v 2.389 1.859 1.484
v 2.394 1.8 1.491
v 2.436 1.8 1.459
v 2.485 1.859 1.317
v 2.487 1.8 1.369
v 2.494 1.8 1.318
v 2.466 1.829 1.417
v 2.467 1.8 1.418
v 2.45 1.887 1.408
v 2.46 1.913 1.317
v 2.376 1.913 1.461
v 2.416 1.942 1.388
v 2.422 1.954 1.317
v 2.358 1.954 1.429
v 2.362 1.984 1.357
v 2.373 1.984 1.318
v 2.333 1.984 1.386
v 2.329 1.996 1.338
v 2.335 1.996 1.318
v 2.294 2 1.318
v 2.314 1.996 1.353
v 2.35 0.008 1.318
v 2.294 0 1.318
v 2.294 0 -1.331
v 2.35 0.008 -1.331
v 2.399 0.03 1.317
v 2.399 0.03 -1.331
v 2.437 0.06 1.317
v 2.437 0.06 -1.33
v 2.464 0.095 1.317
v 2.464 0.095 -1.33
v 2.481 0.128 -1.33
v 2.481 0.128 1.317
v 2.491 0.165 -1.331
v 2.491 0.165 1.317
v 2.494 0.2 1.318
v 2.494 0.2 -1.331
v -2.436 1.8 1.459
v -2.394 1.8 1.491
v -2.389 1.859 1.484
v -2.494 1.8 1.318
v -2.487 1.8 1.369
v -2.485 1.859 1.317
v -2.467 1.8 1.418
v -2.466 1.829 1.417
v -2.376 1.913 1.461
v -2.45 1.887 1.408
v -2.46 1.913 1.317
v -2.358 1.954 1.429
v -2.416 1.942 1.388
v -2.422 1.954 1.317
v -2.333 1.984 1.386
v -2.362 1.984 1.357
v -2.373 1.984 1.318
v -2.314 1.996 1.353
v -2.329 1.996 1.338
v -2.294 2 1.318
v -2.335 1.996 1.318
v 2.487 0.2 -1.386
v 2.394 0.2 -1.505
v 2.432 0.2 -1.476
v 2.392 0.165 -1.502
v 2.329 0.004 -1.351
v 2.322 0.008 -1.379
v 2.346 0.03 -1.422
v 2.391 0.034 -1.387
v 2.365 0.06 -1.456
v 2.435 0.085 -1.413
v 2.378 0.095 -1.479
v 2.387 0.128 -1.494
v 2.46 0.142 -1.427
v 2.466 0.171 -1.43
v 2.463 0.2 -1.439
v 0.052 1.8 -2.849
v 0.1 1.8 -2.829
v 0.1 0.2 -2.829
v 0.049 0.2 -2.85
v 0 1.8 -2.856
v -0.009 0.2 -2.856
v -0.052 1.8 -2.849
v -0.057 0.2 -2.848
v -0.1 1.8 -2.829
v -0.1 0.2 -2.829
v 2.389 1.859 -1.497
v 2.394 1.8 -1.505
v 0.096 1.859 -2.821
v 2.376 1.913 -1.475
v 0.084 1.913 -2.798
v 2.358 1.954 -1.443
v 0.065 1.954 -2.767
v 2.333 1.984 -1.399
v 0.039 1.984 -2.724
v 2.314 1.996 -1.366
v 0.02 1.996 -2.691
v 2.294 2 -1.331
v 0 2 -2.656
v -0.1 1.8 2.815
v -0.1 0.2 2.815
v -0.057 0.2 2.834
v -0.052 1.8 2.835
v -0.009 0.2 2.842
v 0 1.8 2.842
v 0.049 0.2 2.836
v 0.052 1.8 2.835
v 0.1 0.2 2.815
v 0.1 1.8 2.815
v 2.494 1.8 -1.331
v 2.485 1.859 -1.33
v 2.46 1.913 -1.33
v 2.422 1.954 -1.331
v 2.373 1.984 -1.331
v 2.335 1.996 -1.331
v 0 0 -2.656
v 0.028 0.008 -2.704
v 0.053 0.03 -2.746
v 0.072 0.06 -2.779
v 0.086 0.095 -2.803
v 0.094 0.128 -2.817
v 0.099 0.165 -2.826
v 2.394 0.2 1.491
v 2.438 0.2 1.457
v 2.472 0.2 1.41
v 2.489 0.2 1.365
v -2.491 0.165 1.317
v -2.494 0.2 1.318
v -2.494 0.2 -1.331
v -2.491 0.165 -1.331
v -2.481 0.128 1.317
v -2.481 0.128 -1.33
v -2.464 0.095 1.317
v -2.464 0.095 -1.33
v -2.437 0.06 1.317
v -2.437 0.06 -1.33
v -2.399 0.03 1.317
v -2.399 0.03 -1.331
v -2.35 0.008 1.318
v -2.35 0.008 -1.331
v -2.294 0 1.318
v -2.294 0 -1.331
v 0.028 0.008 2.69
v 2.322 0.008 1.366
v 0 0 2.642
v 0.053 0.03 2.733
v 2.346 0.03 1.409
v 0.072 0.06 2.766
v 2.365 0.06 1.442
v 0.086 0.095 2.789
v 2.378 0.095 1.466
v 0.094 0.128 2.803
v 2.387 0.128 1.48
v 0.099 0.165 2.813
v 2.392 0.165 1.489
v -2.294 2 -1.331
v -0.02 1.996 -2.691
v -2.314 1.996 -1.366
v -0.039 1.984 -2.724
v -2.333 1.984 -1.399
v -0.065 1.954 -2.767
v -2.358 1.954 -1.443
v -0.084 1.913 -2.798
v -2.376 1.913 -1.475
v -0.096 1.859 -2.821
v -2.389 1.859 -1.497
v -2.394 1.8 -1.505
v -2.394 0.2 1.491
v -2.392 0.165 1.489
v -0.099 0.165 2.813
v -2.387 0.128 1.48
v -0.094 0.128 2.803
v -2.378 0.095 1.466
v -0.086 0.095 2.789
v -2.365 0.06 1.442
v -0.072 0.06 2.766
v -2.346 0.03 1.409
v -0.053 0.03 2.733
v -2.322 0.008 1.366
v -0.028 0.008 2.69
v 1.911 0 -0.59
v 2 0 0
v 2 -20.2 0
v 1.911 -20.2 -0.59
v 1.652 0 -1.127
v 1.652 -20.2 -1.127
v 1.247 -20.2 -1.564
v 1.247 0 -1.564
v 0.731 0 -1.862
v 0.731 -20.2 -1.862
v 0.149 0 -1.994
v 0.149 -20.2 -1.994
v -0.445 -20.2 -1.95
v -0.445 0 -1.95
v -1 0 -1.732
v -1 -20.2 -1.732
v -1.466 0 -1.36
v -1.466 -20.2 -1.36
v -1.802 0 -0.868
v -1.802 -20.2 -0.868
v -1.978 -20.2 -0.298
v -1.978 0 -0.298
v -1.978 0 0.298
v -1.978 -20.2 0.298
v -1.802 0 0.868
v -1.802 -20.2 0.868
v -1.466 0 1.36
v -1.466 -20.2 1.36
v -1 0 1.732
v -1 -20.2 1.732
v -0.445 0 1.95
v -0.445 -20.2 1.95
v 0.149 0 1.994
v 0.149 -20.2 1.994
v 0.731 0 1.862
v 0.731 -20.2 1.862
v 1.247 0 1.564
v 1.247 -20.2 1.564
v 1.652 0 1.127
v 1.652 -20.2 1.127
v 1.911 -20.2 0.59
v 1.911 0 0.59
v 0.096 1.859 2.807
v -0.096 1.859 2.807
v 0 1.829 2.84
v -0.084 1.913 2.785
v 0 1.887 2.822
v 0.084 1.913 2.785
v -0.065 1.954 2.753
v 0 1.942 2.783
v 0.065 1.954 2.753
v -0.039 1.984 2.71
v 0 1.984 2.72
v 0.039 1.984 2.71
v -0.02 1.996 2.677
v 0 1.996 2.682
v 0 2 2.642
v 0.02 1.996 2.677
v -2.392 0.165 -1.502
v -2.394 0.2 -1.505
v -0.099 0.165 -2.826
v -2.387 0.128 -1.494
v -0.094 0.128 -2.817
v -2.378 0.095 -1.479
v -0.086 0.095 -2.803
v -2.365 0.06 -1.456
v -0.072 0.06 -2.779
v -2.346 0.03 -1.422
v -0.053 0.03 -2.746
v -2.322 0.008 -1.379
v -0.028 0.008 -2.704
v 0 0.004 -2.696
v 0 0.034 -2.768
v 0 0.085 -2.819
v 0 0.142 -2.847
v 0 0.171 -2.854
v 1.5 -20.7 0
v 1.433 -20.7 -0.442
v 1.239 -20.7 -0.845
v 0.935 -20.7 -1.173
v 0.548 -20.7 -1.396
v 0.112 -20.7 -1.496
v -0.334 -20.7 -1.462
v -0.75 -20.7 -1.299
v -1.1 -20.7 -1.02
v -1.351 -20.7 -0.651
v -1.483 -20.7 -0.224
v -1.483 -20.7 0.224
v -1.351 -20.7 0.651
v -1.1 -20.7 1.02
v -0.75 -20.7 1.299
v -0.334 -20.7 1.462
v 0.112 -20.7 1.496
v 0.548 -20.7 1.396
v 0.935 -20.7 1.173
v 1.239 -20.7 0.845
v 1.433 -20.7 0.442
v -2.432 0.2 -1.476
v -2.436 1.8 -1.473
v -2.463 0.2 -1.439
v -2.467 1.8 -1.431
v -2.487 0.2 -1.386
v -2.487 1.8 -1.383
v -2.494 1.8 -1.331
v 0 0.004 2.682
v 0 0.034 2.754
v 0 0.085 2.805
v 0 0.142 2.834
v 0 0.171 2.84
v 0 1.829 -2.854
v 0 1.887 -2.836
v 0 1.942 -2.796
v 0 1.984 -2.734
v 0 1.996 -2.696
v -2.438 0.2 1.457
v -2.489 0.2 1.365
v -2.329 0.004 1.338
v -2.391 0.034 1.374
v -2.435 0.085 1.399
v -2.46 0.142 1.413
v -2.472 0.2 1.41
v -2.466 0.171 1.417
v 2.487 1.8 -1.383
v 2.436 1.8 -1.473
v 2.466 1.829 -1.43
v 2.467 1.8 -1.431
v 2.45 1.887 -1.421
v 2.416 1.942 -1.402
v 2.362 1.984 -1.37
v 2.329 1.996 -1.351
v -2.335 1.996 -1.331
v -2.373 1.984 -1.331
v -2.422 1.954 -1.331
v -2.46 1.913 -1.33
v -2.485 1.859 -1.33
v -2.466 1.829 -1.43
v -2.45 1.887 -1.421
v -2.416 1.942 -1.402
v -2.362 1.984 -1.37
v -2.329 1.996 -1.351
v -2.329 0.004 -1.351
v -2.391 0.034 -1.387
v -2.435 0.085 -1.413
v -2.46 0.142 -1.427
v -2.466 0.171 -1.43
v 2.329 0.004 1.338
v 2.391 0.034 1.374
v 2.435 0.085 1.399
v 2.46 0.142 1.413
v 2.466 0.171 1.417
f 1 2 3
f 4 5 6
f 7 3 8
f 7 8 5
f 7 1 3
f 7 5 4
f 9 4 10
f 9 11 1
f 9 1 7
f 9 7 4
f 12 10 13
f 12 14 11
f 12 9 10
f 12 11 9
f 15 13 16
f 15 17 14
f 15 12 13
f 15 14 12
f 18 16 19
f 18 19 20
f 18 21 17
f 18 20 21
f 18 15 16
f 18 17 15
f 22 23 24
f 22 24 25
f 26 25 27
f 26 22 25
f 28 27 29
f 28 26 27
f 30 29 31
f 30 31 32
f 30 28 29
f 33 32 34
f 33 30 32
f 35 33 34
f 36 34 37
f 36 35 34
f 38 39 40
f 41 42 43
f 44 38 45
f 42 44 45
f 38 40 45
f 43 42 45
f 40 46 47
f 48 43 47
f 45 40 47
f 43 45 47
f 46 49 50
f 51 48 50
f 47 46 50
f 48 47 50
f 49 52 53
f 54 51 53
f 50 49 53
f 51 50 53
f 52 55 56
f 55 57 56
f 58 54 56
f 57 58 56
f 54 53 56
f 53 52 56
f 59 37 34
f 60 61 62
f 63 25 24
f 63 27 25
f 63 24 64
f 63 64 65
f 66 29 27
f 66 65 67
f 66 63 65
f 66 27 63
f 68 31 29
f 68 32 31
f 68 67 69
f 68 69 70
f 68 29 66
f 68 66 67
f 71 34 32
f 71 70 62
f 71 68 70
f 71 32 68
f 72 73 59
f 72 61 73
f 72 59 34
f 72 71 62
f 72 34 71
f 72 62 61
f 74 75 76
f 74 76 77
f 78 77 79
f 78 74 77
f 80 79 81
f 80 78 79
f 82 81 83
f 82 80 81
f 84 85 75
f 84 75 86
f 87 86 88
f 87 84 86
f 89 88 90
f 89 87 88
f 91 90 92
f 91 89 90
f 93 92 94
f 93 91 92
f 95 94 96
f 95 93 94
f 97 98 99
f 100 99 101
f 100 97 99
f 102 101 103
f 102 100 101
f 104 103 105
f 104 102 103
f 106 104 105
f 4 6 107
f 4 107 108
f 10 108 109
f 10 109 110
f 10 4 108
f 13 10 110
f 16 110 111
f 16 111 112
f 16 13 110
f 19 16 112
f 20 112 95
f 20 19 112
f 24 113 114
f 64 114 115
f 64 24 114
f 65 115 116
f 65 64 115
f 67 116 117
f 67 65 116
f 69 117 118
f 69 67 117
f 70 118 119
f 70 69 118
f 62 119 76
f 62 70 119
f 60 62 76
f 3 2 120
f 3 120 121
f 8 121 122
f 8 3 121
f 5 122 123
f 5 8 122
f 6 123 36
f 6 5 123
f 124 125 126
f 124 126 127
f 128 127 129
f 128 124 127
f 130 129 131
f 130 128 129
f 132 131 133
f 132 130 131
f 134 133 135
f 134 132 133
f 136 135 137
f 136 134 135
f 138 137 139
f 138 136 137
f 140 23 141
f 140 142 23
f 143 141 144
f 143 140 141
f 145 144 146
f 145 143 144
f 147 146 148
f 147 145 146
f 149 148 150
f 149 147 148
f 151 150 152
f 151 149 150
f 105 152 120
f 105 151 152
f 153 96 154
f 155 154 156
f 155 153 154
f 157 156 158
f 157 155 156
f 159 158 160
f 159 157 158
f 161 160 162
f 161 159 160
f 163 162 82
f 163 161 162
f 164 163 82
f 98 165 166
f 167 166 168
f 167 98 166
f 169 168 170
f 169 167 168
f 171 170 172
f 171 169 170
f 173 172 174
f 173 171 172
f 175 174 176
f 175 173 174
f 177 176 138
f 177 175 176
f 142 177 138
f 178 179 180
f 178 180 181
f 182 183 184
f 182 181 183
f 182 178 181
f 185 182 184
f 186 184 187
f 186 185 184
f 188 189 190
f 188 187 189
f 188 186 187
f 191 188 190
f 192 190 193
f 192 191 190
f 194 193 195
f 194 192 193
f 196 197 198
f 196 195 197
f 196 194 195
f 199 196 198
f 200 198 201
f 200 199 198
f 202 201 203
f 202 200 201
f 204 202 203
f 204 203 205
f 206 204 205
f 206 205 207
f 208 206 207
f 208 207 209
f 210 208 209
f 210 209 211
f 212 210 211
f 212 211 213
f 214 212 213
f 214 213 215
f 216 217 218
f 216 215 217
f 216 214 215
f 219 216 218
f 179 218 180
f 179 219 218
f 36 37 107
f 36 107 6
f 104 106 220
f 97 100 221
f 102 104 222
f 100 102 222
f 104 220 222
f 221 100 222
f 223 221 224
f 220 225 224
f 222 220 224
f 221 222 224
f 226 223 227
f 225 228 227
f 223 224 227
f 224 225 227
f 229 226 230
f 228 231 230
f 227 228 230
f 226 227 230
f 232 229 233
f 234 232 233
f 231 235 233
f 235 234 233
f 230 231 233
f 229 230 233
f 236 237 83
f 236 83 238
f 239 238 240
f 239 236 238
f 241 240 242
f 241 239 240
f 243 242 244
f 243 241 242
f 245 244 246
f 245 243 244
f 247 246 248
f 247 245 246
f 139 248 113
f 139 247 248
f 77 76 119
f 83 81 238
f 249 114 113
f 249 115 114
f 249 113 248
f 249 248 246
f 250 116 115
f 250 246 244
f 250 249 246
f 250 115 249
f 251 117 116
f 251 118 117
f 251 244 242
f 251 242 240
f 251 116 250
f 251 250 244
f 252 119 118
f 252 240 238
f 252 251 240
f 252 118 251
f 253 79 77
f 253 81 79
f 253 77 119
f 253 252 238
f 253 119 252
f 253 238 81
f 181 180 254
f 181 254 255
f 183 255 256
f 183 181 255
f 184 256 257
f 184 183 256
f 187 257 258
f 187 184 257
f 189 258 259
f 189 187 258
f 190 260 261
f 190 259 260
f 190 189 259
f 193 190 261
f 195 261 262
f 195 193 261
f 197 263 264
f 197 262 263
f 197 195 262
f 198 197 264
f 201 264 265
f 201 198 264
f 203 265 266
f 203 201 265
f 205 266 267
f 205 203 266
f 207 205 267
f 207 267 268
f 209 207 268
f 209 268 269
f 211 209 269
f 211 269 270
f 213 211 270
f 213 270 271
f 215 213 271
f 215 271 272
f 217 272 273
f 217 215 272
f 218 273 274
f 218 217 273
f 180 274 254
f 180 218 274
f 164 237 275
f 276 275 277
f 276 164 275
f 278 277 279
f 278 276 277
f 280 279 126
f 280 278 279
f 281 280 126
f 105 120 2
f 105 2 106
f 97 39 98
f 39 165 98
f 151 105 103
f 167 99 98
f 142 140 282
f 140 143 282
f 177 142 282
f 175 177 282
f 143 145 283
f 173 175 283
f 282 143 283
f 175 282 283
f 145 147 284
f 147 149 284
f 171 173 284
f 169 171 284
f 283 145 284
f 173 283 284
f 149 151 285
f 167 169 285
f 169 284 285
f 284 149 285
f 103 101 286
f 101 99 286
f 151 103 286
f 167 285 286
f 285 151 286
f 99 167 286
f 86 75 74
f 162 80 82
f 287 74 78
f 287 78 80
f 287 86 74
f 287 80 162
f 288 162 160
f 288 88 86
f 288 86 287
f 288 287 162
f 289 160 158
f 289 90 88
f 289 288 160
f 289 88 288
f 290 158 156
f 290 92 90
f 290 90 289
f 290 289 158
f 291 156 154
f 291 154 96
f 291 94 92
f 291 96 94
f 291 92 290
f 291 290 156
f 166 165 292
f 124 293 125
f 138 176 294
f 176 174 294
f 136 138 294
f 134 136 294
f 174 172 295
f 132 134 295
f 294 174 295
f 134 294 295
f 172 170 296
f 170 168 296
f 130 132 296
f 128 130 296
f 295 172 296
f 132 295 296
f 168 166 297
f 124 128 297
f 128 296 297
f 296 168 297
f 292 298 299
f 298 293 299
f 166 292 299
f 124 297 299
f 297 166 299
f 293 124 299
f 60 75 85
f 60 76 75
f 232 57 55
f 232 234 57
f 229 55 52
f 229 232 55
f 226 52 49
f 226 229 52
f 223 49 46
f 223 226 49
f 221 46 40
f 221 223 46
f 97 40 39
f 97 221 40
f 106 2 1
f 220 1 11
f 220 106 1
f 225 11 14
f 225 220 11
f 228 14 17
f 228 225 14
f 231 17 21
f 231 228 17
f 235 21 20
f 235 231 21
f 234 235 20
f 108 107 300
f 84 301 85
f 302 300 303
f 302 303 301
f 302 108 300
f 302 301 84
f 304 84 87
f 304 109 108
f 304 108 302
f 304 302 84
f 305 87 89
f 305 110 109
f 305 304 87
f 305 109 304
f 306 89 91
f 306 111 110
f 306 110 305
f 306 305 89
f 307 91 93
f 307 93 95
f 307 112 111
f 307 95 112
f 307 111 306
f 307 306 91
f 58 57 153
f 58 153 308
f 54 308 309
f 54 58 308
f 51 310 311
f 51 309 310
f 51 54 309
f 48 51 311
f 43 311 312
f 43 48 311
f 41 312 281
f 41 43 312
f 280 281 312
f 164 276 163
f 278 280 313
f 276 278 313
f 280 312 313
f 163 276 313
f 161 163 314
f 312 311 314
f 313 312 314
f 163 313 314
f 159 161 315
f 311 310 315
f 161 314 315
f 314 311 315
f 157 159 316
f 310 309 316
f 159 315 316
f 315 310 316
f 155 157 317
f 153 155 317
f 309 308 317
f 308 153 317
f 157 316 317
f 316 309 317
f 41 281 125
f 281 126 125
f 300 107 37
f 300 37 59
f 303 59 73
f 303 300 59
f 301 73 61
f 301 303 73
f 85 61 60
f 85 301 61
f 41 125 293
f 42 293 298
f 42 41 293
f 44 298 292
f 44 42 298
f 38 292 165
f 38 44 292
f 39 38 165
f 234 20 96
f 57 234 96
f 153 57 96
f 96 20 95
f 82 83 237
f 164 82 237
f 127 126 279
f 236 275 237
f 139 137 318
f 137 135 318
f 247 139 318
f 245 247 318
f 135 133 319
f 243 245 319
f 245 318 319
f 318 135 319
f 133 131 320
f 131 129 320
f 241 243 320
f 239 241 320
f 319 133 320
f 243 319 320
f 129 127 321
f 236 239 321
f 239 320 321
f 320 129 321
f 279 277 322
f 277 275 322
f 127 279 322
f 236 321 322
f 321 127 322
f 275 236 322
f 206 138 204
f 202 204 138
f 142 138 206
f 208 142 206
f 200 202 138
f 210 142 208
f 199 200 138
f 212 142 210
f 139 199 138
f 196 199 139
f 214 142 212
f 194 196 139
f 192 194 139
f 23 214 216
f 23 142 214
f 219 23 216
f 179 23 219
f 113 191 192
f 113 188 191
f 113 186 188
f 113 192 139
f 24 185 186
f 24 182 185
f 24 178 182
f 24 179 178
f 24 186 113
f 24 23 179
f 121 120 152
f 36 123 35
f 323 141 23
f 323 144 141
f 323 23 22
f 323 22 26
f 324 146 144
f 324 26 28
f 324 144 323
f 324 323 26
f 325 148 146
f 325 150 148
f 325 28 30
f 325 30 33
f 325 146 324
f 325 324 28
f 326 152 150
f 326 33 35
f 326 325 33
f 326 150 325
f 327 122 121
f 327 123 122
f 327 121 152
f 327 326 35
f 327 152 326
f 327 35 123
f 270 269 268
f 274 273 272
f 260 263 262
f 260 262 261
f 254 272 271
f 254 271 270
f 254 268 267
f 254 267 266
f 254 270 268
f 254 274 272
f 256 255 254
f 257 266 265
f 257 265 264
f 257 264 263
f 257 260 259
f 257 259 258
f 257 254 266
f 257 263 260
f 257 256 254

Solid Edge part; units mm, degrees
sketch "Sketch1" plane through (0, 0, 0) normal (0, -1, 0) x (1, 0, 0)
  circle A0 centre (0, 0) radius 2
extrude "Protrusion1" add sketch "Sketch1" along normal blind 20.7
sketch "Sketch2" plane through (0, 0, 0) normal (0, 1, 0) x (1, 0, 0)
  line L0 (2.4942, -1.4332) -> (0, -2.8732)
  line L1 (-2.4942, -1.4332) -> (0, -2.8732)
  line L2 (-2.4942, 1.4468) -> (-2.4942, -1.4332)
  line L3 (0, 2.8868) -> (-2.4942, 1.4468)
  line L4 (0, 2.8868) -> (2.4942, 1.4468)
  line L5 (2.4942, 1.4468) -> (2.4942, -1.4332)
extrude "ExtrudedProtrusion_2" add sketch "Sketch2" along normal blind 2
fillet "Round_1" radius 0.2 12 edges at (1.2471, 0, 2.1532) (-1.2471, 0, 2.1532) (2.4942, 0, -0.0068) (1.2471, 0, -2.1668) (-1.2471, 0, -2.1668) (-2.4942, 0, -0.0068) (1.2471, 2, 2.1532) (-1.2471, 2, 2.1532) (-2.4942, 2, -0.0068) (-1.2471, 2, -2.1668) (1.2471, 2, -2.1668) (2.4942, 2, -0.0068)
fillet "Round_2" radius 0.2 18 edges at (0, 1, 2.8732) (0, 0.0586, 2.8056) (0, 1.9414, 2.8056) (2.4942, 1, 1.4332) (2.4356, 0.0586, 1.3994) (2.4356, 1.9414, 1.3994) (2.4942, 1, -1.4468) (2.4356, 0.0586, -1.4129) (2.4356, 1.9414, -1.4129) (-2.4942, 1, 1.4332) (-2.4356, 0.0586, 1.3994) (-2.4356, 1.9414, 1.3994) (0, 1, -2.8868) (0, 0.0586, -2.8191) (0, 1.9414, -2.8191) (-2.4942, 1, -1.4468) (-2.4356, 0.0586, -1.4129) (-2.4356, 1.9414, -1.4129)
chamfer "Chamfer_1" distance 0.5 angle 45 1 edges at (-2, -20.7, 0)
properties material "PVC"
